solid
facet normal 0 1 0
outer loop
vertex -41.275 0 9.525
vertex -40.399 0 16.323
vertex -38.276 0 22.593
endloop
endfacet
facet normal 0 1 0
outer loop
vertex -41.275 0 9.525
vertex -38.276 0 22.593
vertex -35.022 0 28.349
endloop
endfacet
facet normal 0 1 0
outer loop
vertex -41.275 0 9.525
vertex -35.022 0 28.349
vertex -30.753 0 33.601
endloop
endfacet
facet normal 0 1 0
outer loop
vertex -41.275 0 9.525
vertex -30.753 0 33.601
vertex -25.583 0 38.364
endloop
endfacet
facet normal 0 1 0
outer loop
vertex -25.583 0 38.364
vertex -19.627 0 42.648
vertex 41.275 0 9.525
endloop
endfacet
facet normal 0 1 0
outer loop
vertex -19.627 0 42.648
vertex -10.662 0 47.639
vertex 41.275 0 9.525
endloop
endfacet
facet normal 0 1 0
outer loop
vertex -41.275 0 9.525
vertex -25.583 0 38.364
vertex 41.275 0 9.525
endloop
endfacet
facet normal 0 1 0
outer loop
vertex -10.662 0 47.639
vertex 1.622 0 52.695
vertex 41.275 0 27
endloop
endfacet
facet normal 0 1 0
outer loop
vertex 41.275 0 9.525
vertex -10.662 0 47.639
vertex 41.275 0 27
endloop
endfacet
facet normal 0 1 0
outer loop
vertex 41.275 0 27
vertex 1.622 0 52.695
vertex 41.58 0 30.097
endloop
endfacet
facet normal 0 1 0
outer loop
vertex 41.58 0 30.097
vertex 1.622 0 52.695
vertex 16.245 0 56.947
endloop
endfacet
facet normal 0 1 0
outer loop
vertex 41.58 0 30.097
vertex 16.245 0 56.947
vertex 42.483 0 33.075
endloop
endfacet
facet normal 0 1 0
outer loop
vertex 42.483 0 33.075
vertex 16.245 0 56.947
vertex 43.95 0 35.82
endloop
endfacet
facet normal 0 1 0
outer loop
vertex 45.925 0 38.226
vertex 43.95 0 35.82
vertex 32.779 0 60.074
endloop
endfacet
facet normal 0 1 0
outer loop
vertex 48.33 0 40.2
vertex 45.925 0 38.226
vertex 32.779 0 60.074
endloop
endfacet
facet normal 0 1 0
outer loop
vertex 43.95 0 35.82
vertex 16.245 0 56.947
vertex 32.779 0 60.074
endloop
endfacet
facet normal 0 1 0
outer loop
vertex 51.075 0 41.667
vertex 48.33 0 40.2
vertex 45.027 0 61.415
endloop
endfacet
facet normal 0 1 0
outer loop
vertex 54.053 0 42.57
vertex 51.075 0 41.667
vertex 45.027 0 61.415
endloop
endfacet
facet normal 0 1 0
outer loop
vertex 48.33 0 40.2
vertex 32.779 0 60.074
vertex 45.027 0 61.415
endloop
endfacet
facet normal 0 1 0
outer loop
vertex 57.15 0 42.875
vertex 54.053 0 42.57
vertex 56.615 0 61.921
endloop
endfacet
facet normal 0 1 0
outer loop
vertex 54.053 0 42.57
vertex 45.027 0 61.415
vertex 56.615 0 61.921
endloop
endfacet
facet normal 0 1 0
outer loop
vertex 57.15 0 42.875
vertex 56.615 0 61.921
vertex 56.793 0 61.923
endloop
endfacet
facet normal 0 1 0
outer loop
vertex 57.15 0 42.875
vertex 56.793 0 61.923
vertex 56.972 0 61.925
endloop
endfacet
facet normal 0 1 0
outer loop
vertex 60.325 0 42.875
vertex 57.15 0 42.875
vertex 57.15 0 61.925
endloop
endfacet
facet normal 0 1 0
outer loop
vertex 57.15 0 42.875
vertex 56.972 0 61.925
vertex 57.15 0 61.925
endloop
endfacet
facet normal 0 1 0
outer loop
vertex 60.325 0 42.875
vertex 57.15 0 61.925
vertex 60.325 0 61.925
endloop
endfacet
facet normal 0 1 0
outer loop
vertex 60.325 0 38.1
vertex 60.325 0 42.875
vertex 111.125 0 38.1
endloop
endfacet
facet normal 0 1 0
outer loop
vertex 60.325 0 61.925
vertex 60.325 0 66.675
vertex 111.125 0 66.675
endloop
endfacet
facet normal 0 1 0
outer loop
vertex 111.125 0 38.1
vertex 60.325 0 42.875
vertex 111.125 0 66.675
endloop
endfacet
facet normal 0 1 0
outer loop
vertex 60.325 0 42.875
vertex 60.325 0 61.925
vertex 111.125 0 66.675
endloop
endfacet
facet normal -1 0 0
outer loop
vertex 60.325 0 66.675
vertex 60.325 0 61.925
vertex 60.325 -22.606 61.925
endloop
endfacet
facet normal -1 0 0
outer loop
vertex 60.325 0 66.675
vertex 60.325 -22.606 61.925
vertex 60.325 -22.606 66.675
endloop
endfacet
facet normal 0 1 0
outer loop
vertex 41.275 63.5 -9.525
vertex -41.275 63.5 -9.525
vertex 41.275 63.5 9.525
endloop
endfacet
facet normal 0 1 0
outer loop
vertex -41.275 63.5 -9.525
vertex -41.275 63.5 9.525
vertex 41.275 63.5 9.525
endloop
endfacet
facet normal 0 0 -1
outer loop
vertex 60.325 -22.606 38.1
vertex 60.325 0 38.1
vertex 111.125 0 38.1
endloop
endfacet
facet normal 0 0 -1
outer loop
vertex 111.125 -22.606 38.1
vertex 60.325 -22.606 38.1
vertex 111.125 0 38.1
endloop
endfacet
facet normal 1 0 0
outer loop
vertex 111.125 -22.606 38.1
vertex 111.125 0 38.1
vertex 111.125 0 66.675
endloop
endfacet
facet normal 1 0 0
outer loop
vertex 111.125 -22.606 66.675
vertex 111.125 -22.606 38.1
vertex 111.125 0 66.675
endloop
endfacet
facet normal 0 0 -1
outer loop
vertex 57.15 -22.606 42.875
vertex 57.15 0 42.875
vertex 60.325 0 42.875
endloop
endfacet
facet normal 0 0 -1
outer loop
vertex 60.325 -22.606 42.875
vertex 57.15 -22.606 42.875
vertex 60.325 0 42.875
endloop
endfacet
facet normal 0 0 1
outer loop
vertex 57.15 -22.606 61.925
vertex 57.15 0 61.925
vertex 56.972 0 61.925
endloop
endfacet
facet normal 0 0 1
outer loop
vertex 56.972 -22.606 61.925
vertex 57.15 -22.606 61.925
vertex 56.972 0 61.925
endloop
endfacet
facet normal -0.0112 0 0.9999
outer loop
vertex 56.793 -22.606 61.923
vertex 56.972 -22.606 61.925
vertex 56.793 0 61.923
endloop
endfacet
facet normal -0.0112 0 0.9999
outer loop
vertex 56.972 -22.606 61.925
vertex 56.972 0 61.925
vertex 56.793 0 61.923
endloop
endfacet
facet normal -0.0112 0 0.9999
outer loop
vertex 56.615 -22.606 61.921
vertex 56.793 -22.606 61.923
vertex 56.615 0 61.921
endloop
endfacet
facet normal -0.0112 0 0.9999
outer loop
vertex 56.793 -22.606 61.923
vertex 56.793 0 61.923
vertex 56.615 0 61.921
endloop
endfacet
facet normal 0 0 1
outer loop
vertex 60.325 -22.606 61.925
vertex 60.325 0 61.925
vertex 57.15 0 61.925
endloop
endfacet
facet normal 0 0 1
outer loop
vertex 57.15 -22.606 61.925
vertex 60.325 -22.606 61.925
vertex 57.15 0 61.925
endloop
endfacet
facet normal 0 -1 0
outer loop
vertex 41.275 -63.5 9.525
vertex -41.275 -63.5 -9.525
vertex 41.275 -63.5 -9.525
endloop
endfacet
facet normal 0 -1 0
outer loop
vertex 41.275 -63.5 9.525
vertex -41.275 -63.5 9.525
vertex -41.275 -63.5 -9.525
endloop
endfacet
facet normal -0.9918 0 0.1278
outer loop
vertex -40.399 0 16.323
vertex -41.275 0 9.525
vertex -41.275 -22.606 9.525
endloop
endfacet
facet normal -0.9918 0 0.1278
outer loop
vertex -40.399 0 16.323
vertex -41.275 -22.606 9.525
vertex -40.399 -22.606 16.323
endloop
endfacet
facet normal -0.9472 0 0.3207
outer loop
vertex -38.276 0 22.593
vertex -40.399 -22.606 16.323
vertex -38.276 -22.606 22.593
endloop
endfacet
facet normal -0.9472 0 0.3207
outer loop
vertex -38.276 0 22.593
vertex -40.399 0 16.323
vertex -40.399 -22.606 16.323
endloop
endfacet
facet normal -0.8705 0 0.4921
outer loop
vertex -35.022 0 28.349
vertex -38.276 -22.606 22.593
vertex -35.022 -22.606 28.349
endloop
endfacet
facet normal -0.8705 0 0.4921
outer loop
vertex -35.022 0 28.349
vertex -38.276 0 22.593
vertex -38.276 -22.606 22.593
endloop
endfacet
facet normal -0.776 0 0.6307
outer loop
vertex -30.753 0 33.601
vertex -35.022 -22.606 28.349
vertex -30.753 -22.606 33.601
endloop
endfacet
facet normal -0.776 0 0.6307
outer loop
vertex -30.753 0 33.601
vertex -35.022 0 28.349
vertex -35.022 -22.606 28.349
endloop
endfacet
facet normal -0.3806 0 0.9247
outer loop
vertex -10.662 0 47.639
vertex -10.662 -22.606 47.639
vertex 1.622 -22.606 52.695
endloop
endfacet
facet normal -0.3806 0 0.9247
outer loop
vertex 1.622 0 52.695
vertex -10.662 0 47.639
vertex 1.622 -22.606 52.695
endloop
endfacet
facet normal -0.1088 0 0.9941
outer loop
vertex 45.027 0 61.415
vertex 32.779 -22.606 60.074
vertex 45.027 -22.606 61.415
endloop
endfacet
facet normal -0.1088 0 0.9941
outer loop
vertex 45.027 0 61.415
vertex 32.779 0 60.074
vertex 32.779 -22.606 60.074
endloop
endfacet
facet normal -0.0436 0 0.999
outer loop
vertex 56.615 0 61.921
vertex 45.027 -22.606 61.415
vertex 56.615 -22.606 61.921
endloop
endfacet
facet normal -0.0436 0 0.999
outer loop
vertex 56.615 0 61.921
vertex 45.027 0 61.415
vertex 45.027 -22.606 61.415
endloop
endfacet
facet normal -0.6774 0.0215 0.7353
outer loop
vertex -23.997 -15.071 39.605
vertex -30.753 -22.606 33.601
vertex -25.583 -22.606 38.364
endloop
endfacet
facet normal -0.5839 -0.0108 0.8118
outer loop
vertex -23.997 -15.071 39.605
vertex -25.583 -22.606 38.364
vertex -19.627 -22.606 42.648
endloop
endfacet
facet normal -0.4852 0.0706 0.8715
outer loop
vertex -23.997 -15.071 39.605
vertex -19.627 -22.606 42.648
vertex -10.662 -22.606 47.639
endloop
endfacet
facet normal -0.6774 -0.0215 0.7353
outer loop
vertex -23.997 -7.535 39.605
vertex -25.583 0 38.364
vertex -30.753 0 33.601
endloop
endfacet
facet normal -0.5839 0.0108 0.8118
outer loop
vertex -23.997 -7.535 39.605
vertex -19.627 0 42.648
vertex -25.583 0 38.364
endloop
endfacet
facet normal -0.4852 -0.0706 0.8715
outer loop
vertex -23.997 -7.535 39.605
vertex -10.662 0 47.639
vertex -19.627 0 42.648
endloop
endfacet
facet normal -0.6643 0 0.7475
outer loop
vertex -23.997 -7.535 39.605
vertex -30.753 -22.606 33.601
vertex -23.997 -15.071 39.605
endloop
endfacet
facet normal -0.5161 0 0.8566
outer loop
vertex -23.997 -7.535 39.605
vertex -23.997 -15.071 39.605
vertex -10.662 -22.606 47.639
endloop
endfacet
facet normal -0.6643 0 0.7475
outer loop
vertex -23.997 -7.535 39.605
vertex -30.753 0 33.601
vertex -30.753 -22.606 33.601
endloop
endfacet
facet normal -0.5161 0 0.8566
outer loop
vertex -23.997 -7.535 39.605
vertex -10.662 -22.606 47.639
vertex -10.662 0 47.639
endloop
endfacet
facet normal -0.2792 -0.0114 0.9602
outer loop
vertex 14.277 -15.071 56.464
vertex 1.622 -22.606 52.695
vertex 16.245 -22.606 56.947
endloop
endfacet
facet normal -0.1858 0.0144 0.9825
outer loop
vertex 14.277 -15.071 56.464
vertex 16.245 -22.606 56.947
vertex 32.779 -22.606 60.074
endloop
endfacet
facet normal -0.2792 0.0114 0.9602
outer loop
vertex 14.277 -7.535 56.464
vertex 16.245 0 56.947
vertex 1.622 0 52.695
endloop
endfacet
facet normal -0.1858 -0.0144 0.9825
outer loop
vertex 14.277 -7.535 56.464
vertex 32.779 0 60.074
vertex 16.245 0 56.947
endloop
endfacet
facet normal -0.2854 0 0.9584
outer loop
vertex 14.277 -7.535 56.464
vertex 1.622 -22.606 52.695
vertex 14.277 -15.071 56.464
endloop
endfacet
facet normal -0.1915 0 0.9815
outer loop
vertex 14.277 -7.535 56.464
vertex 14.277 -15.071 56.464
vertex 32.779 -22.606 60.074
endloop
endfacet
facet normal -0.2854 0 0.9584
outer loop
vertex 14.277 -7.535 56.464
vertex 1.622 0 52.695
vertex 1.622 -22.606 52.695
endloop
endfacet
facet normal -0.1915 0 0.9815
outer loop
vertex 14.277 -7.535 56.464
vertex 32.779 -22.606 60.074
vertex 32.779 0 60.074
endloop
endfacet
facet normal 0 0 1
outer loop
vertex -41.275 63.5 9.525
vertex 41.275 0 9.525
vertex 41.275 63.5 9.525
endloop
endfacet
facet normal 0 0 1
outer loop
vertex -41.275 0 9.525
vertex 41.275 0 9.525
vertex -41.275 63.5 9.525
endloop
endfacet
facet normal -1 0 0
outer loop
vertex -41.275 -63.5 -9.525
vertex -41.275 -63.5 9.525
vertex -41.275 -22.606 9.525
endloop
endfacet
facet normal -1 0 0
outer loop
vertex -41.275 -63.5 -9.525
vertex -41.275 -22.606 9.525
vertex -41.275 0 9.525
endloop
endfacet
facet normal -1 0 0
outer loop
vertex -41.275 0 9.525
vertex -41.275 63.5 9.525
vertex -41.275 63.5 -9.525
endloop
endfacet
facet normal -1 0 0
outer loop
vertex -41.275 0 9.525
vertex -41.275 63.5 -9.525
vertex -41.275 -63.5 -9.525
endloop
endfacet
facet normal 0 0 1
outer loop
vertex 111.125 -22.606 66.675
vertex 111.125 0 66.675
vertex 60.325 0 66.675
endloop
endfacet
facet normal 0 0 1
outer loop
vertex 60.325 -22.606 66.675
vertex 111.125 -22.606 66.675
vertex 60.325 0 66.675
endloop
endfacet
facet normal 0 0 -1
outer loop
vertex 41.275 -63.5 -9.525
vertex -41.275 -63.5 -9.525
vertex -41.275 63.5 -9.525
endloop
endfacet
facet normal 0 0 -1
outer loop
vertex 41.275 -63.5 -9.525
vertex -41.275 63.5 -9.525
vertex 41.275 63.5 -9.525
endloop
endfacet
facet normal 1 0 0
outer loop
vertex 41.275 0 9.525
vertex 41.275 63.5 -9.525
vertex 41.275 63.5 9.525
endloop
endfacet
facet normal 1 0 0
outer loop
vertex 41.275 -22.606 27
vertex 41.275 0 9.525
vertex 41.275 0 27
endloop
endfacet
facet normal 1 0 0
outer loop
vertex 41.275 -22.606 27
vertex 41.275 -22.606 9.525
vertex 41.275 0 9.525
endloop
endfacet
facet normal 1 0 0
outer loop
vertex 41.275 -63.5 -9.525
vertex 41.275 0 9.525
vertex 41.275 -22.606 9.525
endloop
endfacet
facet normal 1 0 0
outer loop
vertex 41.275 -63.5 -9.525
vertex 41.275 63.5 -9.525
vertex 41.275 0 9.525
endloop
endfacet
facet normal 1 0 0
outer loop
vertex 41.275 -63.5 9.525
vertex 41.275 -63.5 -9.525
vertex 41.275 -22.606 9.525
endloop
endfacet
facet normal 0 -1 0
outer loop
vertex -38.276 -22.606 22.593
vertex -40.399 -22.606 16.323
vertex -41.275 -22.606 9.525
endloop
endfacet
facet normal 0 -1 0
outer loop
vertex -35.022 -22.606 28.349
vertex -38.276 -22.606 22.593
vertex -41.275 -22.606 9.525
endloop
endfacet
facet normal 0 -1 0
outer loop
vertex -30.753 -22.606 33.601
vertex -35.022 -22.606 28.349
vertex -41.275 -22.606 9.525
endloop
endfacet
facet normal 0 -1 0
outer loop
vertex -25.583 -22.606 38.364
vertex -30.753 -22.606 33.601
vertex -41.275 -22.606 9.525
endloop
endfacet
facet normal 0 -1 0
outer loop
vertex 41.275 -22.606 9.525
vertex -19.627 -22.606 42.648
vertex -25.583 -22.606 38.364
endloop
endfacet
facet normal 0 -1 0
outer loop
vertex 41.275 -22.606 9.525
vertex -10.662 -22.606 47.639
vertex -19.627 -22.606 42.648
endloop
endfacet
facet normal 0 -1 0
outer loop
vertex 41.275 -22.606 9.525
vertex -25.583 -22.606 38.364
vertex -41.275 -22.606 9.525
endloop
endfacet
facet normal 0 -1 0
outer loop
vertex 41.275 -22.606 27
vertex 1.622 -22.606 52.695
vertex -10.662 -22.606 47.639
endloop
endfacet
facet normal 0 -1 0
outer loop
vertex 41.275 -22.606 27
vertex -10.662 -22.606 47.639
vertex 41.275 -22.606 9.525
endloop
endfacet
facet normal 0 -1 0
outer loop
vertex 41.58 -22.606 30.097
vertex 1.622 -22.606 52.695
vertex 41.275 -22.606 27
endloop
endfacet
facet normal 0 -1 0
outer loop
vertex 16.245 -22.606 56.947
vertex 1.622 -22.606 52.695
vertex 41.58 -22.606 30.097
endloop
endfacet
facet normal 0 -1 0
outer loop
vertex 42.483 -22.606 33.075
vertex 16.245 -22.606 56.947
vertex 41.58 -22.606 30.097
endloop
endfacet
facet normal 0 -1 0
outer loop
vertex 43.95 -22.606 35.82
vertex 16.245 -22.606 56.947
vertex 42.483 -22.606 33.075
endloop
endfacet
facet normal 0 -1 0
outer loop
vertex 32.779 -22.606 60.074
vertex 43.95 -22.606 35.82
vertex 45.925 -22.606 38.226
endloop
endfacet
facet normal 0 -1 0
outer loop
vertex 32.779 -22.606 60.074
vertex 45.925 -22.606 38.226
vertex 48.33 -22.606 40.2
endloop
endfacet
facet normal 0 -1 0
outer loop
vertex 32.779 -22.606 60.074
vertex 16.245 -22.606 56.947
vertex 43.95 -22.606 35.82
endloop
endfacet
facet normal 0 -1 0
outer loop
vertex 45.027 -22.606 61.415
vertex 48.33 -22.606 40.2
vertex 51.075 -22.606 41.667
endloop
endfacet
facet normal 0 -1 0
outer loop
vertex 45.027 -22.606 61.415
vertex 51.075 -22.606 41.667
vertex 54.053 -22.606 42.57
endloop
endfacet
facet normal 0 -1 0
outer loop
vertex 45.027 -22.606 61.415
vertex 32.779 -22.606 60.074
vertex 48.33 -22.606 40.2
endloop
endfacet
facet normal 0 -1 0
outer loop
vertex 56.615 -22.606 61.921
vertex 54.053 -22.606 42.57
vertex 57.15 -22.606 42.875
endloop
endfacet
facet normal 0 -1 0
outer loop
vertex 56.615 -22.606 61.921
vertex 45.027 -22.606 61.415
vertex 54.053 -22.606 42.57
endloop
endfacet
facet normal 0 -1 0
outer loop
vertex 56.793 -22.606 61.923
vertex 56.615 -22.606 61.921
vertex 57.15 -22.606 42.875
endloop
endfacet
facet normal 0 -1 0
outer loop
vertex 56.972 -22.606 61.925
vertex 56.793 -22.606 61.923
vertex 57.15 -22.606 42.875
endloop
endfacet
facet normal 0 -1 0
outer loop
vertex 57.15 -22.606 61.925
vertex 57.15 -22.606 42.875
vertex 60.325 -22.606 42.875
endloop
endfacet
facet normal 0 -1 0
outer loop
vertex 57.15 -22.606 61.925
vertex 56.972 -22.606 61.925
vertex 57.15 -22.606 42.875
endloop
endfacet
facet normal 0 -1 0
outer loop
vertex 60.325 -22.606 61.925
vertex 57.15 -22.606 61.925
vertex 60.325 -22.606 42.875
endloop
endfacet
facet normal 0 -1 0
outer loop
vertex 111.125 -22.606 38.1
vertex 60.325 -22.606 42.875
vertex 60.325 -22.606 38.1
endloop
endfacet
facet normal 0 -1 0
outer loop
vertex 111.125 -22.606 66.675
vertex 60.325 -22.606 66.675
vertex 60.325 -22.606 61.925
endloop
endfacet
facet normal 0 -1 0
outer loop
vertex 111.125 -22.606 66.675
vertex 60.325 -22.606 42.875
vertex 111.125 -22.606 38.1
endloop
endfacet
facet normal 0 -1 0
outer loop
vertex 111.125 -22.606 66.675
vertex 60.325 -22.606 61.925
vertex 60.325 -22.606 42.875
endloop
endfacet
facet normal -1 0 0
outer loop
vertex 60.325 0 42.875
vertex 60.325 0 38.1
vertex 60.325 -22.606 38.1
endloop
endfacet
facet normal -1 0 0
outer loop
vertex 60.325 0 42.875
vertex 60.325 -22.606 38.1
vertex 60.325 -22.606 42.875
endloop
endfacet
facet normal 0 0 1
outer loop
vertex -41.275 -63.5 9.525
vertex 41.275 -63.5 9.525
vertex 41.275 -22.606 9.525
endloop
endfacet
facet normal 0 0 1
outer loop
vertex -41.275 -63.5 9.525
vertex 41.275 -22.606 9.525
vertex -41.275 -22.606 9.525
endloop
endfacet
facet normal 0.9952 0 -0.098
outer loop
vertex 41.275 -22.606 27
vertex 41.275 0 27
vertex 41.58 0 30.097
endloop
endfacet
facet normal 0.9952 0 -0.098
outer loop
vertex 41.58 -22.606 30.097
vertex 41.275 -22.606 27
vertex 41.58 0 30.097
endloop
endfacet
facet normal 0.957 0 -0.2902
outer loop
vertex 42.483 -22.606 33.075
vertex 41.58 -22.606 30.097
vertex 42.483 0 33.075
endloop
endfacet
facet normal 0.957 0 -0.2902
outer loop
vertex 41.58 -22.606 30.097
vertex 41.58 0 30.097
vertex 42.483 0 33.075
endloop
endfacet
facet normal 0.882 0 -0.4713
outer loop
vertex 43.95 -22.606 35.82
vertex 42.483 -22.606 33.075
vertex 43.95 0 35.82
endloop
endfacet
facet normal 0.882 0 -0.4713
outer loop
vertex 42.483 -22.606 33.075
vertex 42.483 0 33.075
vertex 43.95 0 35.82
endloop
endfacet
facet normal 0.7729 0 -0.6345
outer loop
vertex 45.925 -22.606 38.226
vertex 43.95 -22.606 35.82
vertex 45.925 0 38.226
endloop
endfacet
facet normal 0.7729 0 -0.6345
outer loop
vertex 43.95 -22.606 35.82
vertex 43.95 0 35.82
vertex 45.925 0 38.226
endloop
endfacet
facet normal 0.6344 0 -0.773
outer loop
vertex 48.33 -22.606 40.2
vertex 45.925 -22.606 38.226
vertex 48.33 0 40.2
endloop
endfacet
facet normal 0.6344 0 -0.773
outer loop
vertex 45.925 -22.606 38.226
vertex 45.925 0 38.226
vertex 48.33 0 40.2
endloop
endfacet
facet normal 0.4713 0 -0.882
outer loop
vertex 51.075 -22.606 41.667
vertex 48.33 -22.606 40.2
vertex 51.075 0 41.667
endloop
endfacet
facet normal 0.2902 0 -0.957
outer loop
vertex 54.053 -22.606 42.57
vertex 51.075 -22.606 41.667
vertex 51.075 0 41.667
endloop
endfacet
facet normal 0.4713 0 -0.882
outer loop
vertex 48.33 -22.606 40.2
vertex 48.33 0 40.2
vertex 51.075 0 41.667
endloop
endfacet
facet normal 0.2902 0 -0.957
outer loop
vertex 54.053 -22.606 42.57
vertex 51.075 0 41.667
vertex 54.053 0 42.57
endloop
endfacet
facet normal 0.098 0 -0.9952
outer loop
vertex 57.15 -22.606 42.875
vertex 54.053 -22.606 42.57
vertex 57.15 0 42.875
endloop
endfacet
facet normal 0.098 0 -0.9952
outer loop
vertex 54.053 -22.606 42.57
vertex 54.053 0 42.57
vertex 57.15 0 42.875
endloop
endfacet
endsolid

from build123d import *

# Parameters (mm, degrees)
F1_DEPTH = 63.5
F0_W     = 25.4
F0_H     = 4.7752
F0_H_2   = 19.05
F0_H_3   = 4.7498
F2_DEPTH = 22.606


with BuildPart() as f1:
    # F0 (on Front) → F1 (new body, symmetric)
    with BuildSketch(Plane.XZ):
        Polygon((-41.275, -9.525), (41.275, -9.525), (41.275, 9.525), (22.225, 9.525), (-41.275, 9.525), align=None)
    extrude(amount=F1_DEPTH, both=True)

    # F0 (on Front) → F2 (join)
    with BuildSketch(Plane.XZ):
        Polygon((-41.275, -9.525), (41.275, -9.525), (41.275, 9.525), (22.225, 9.525), (-41.275, 9.525), align=None)
        with BuildLine():
            Line((22.225, 9.525), (41.275, 9.525))
            Line((41.275, 9.525), (41.275, 27.0002))
            ThreePointArc((41.275, 27.0002), (45.9246798487, 38.2255201513), (57.15, 42.8752))
            Line((57.15, 42.8752), (60.325, 42.8752))
            Line((60.325, 42.8752), (60.325, 61.9252))
            Line((60.325, 61.9252), (57.15, 61.9252))
            add(Edge.make_bspline(
                [(56.6150518391, 61.9211028444), (56.7937815954, 61.9227744977), (56.9721001461, 61.924139948), (57.15, 61.9252)],
                knots=[110.9922728255, 110.9922728255, 110.9922728255, 110.9922728255, 111.5045361635, 111.5045361635, 111.5045361635, 111.5045361635], degree=3))
            ThreePointArc((56.6150518391, 61.9211028444), (32.2658816761, 51.5060417574), (22.225, 27.0002))
            Line((22.225, 27.0002), (22.225, 9.525))
        make_face()
        with BuildLine():
            add(Edge.make_bspline(
                [(-41.275, 9.525), (-40.1402965099, 46.8216899359), (17.8896143528, 61.5589051427), (56.6150518391, 61.9211028444)],
                knots=[0, 0, 0, 0, 110.9922728255, 110.9922728255, 110.9922728255, 110.9922728255], degree=3))
            Line((-41.275, 9.525), (22.225, 9.525))
            Line((22.225, 9.525), (22.225, 27.0002))
            ThreePointArc((22.225, 27.0002), (32.2658816761, 51.5060417574), (56.6150518391, 61.9211028444))
        make_face()
        with BuildLine():
            ThreePointArc((57.15, 61.9252), (56.8825180747, 61.9241756961), (56.6150518391, 61.9211028444))
            add(Edge.make_bspline(
                [(56.6150518391, 61.9211028444), (56.7937815954, 61.9227744977), (56.9721001461, 61.924139948), (57.15, 61.9252)],
                knots=[110.9922728255, 110.9922728255, 110.9922728255, 110.9922728255, 111.5045361635, 111.5045361635, 111.5045361635, 111.5045361635], degree=3))
        make_face()
        with Locations((73.025, 40.4876)):
            Rectangle(F0_W, F0_H)
        with Locations((73.025, 52.4002)):
            Rectangle(F0_W, F0_H_2)
        with Locations((73.025, 64.3001)):
            Rectangle(F0_W, F0_H_3)
        Polygon((85.725, 61.9252), (85.725, 42.8752), (85.725, 38.1), (111.125, 38.1), (111.125, 66.675), (85.725, 66.675), align=None)
    extrude(amount=F2_DEPTH)


solid = f1.part
